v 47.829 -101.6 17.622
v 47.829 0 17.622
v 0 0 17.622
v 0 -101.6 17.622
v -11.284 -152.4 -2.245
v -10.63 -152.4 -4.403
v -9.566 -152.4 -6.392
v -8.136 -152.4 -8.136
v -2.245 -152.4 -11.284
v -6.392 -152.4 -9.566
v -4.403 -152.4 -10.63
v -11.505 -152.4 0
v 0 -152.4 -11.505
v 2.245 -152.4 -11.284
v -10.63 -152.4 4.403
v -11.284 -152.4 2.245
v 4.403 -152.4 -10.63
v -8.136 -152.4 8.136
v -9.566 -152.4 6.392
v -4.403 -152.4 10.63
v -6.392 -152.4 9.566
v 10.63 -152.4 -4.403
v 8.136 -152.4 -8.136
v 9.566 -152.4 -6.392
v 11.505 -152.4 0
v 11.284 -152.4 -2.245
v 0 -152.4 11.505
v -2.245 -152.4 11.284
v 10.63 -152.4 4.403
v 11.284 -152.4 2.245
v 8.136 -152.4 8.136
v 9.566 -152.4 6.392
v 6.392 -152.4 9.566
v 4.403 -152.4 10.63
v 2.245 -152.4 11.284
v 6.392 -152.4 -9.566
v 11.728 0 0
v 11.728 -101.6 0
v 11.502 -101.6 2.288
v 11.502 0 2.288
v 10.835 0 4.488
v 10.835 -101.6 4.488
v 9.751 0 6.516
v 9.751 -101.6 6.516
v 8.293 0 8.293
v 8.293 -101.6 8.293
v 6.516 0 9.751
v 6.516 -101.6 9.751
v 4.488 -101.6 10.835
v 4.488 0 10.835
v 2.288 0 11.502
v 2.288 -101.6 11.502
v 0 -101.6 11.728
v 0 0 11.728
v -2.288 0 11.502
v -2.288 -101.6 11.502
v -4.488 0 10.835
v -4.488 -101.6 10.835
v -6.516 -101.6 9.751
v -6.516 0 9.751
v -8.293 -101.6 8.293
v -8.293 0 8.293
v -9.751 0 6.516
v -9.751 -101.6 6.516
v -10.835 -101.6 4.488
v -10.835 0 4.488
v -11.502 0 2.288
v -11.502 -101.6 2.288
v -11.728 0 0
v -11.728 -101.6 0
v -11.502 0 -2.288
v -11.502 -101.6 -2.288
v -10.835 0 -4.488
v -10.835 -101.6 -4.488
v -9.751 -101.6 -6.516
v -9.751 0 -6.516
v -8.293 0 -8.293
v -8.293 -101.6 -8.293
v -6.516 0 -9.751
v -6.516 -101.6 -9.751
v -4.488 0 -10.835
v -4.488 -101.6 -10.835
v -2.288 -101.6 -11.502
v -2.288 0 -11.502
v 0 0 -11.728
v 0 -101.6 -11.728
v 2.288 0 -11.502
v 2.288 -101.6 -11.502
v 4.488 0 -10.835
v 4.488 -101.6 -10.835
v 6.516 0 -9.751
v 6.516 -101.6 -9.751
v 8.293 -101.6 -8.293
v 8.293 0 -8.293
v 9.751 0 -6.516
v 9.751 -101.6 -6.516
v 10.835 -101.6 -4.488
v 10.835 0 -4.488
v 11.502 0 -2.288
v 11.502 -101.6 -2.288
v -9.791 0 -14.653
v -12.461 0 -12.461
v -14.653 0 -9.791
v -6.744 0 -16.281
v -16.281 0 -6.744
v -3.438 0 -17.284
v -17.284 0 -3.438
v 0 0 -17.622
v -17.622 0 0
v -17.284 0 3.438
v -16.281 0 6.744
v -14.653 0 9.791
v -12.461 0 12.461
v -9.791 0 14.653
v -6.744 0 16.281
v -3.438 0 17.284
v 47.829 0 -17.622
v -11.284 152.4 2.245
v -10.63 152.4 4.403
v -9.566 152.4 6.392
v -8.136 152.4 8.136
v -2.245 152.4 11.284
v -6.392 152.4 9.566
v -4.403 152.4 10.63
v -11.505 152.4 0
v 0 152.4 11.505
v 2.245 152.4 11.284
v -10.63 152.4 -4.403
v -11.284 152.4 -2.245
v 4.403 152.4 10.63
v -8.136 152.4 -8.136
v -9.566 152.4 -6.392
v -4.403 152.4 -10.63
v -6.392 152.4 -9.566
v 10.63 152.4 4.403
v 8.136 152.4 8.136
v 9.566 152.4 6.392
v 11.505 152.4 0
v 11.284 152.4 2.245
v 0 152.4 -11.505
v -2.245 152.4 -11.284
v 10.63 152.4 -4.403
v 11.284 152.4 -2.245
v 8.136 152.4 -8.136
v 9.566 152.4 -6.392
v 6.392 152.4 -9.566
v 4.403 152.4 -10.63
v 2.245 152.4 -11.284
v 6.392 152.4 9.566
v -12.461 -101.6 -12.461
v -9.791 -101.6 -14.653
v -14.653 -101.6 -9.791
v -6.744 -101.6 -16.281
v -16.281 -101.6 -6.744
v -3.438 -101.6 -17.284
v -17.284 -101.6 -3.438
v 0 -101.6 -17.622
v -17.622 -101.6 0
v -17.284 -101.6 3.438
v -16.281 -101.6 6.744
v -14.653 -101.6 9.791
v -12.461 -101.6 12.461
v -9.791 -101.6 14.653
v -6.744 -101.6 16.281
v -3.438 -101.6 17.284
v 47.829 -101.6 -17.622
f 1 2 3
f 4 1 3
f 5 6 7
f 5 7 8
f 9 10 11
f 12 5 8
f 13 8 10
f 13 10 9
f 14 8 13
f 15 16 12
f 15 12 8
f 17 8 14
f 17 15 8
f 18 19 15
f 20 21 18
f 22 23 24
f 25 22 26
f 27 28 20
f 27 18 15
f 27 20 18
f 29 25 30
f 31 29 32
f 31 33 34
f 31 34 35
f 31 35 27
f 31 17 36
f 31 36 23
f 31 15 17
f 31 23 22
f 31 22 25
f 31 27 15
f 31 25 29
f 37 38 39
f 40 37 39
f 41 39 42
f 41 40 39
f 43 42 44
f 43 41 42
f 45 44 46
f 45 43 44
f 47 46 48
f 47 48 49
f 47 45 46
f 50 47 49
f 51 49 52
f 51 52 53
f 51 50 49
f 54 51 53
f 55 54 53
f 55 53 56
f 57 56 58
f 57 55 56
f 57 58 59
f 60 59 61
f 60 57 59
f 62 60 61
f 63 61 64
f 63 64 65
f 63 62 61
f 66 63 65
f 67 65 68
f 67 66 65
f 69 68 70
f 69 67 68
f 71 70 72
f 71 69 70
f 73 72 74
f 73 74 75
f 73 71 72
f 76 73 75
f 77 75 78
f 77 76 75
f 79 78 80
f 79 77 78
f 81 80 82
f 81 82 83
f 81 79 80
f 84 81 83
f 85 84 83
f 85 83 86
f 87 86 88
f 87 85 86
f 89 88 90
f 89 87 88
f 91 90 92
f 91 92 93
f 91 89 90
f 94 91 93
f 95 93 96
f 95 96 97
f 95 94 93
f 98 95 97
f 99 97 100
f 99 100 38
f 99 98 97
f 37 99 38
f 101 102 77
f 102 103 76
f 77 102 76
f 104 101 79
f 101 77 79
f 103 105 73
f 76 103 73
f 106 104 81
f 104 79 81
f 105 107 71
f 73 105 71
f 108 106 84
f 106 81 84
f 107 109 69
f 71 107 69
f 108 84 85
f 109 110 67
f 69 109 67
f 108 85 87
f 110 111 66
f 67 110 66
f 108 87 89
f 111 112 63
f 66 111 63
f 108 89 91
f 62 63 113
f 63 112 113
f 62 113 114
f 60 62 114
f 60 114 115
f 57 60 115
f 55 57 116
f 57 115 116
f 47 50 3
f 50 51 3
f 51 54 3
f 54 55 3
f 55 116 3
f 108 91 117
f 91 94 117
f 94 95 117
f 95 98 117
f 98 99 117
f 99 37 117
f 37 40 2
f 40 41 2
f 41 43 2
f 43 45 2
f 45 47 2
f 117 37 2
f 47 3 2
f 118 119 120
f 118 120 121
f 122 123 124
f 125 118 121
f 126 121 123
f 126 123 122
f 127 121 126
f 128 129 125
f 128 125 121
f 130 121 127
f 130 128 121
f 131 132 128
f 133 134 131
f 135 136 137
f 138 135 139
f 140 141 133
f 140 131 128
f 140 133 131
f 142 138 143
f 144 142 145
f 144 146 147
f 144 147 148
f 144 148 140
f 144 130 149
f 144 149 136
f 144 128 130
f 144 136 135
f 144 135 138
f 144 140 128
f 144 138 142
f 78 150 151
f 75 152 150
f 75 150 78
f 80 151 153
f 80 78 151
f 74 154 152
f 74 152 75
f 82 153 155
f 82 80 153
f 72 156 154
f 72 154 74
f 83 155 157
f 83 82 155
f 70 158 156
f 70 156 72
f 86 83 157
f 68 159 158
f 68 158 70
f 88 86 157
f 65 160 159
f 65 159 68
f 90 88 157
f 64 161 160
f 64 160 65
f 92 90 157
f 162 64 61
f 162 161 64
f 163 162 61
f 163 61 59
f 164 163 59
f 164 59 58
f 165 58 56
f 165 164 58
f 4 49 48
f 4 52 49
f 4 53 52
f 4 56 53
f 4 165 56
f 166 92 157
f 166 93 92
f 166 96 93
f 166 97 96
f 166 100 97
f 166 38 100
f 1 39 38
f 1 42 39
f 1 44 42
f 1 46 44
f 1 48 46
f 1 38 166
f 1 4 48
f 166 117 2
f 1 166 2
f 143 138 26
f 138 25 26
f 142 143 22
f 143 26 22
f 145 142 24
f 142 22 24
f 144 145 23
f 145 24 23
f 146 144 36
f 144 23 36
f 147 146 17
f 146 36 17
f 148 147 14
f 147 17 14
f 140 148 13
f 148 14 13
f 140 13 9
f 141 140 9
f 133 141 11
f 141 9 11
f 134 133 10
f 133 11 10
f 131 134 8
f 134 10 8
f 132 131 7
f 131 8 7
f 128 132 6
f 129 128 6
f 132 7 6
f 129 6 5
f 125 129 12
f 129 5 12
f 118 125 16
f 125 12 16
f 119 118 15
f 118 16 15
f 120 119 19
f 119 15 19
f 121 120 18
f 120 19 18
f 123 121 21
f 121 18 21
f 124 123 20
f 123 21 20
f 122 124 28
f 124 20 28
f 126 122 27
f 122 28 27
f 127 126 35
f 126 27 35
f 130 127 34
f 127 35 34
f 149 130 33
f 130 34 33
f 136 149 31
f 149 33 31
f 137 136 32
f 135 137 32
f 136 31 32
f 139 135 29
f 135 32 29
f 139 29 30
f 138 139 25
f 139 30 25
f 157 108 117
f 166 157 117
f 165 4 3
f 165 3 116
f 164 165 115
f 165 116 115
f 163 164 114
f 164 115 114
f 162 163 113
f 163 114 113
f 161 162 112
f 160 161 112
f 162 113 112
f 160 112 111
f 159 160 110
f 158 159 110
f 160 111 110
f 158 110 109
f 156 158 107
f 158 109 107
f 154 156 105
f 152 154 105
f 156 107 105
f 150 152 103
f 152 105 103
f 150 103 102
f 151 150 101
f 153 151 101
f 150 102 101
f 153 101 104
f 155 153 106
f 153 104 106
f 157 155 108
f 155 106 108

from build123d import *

# Parameters (mm, degrees)
F0_R      = 11.727639
F1_DEPTH  = 101.6
F2_R      = 11.505467
F3_DEPTH  = 50.8
F3_FACE_R = 11.505467
F4_DEPTH  = 254


with BuildPart() as f1:
    # F0 (on Front) → F1 (new body)
    with BuildSketch(Plane.XZ):
        with BuildLine():
            Line((47.829289, 17.622486), (0, 17.622486))
            ThreePointArc((0, 17.622486), (-17.622486, 0), (0, -17.622486))
            Line((0, -17.622486), (47.829289, -17.622486))
            Line((47.829289, -17.622486), (47.829289, 17.622486))
        make_face()
        Circle(F0_R, mode=Mode.SUBTRACT)
    extrude(amount=F1_DEPTH)


with BuildPart() as f3:
    # F2 (on face) → F3 (new body)
    with BuildSketch(Plane.XZ.offset(101.6)):
        Circle(F2_R)
    extrude(amount=F3_DEPTH)

    # F3_face (on face) → F4 (join)
    with BuildSketch(Plane(origin=(0, -101.6, 0), x_dir=(1, 0, 0), z_dir=(0, 1, 0))):
        Circle(F3_FACE_R)
    extrude(amount=F4_DEPTH)


solid = Compound([f1.part, f3.part])
